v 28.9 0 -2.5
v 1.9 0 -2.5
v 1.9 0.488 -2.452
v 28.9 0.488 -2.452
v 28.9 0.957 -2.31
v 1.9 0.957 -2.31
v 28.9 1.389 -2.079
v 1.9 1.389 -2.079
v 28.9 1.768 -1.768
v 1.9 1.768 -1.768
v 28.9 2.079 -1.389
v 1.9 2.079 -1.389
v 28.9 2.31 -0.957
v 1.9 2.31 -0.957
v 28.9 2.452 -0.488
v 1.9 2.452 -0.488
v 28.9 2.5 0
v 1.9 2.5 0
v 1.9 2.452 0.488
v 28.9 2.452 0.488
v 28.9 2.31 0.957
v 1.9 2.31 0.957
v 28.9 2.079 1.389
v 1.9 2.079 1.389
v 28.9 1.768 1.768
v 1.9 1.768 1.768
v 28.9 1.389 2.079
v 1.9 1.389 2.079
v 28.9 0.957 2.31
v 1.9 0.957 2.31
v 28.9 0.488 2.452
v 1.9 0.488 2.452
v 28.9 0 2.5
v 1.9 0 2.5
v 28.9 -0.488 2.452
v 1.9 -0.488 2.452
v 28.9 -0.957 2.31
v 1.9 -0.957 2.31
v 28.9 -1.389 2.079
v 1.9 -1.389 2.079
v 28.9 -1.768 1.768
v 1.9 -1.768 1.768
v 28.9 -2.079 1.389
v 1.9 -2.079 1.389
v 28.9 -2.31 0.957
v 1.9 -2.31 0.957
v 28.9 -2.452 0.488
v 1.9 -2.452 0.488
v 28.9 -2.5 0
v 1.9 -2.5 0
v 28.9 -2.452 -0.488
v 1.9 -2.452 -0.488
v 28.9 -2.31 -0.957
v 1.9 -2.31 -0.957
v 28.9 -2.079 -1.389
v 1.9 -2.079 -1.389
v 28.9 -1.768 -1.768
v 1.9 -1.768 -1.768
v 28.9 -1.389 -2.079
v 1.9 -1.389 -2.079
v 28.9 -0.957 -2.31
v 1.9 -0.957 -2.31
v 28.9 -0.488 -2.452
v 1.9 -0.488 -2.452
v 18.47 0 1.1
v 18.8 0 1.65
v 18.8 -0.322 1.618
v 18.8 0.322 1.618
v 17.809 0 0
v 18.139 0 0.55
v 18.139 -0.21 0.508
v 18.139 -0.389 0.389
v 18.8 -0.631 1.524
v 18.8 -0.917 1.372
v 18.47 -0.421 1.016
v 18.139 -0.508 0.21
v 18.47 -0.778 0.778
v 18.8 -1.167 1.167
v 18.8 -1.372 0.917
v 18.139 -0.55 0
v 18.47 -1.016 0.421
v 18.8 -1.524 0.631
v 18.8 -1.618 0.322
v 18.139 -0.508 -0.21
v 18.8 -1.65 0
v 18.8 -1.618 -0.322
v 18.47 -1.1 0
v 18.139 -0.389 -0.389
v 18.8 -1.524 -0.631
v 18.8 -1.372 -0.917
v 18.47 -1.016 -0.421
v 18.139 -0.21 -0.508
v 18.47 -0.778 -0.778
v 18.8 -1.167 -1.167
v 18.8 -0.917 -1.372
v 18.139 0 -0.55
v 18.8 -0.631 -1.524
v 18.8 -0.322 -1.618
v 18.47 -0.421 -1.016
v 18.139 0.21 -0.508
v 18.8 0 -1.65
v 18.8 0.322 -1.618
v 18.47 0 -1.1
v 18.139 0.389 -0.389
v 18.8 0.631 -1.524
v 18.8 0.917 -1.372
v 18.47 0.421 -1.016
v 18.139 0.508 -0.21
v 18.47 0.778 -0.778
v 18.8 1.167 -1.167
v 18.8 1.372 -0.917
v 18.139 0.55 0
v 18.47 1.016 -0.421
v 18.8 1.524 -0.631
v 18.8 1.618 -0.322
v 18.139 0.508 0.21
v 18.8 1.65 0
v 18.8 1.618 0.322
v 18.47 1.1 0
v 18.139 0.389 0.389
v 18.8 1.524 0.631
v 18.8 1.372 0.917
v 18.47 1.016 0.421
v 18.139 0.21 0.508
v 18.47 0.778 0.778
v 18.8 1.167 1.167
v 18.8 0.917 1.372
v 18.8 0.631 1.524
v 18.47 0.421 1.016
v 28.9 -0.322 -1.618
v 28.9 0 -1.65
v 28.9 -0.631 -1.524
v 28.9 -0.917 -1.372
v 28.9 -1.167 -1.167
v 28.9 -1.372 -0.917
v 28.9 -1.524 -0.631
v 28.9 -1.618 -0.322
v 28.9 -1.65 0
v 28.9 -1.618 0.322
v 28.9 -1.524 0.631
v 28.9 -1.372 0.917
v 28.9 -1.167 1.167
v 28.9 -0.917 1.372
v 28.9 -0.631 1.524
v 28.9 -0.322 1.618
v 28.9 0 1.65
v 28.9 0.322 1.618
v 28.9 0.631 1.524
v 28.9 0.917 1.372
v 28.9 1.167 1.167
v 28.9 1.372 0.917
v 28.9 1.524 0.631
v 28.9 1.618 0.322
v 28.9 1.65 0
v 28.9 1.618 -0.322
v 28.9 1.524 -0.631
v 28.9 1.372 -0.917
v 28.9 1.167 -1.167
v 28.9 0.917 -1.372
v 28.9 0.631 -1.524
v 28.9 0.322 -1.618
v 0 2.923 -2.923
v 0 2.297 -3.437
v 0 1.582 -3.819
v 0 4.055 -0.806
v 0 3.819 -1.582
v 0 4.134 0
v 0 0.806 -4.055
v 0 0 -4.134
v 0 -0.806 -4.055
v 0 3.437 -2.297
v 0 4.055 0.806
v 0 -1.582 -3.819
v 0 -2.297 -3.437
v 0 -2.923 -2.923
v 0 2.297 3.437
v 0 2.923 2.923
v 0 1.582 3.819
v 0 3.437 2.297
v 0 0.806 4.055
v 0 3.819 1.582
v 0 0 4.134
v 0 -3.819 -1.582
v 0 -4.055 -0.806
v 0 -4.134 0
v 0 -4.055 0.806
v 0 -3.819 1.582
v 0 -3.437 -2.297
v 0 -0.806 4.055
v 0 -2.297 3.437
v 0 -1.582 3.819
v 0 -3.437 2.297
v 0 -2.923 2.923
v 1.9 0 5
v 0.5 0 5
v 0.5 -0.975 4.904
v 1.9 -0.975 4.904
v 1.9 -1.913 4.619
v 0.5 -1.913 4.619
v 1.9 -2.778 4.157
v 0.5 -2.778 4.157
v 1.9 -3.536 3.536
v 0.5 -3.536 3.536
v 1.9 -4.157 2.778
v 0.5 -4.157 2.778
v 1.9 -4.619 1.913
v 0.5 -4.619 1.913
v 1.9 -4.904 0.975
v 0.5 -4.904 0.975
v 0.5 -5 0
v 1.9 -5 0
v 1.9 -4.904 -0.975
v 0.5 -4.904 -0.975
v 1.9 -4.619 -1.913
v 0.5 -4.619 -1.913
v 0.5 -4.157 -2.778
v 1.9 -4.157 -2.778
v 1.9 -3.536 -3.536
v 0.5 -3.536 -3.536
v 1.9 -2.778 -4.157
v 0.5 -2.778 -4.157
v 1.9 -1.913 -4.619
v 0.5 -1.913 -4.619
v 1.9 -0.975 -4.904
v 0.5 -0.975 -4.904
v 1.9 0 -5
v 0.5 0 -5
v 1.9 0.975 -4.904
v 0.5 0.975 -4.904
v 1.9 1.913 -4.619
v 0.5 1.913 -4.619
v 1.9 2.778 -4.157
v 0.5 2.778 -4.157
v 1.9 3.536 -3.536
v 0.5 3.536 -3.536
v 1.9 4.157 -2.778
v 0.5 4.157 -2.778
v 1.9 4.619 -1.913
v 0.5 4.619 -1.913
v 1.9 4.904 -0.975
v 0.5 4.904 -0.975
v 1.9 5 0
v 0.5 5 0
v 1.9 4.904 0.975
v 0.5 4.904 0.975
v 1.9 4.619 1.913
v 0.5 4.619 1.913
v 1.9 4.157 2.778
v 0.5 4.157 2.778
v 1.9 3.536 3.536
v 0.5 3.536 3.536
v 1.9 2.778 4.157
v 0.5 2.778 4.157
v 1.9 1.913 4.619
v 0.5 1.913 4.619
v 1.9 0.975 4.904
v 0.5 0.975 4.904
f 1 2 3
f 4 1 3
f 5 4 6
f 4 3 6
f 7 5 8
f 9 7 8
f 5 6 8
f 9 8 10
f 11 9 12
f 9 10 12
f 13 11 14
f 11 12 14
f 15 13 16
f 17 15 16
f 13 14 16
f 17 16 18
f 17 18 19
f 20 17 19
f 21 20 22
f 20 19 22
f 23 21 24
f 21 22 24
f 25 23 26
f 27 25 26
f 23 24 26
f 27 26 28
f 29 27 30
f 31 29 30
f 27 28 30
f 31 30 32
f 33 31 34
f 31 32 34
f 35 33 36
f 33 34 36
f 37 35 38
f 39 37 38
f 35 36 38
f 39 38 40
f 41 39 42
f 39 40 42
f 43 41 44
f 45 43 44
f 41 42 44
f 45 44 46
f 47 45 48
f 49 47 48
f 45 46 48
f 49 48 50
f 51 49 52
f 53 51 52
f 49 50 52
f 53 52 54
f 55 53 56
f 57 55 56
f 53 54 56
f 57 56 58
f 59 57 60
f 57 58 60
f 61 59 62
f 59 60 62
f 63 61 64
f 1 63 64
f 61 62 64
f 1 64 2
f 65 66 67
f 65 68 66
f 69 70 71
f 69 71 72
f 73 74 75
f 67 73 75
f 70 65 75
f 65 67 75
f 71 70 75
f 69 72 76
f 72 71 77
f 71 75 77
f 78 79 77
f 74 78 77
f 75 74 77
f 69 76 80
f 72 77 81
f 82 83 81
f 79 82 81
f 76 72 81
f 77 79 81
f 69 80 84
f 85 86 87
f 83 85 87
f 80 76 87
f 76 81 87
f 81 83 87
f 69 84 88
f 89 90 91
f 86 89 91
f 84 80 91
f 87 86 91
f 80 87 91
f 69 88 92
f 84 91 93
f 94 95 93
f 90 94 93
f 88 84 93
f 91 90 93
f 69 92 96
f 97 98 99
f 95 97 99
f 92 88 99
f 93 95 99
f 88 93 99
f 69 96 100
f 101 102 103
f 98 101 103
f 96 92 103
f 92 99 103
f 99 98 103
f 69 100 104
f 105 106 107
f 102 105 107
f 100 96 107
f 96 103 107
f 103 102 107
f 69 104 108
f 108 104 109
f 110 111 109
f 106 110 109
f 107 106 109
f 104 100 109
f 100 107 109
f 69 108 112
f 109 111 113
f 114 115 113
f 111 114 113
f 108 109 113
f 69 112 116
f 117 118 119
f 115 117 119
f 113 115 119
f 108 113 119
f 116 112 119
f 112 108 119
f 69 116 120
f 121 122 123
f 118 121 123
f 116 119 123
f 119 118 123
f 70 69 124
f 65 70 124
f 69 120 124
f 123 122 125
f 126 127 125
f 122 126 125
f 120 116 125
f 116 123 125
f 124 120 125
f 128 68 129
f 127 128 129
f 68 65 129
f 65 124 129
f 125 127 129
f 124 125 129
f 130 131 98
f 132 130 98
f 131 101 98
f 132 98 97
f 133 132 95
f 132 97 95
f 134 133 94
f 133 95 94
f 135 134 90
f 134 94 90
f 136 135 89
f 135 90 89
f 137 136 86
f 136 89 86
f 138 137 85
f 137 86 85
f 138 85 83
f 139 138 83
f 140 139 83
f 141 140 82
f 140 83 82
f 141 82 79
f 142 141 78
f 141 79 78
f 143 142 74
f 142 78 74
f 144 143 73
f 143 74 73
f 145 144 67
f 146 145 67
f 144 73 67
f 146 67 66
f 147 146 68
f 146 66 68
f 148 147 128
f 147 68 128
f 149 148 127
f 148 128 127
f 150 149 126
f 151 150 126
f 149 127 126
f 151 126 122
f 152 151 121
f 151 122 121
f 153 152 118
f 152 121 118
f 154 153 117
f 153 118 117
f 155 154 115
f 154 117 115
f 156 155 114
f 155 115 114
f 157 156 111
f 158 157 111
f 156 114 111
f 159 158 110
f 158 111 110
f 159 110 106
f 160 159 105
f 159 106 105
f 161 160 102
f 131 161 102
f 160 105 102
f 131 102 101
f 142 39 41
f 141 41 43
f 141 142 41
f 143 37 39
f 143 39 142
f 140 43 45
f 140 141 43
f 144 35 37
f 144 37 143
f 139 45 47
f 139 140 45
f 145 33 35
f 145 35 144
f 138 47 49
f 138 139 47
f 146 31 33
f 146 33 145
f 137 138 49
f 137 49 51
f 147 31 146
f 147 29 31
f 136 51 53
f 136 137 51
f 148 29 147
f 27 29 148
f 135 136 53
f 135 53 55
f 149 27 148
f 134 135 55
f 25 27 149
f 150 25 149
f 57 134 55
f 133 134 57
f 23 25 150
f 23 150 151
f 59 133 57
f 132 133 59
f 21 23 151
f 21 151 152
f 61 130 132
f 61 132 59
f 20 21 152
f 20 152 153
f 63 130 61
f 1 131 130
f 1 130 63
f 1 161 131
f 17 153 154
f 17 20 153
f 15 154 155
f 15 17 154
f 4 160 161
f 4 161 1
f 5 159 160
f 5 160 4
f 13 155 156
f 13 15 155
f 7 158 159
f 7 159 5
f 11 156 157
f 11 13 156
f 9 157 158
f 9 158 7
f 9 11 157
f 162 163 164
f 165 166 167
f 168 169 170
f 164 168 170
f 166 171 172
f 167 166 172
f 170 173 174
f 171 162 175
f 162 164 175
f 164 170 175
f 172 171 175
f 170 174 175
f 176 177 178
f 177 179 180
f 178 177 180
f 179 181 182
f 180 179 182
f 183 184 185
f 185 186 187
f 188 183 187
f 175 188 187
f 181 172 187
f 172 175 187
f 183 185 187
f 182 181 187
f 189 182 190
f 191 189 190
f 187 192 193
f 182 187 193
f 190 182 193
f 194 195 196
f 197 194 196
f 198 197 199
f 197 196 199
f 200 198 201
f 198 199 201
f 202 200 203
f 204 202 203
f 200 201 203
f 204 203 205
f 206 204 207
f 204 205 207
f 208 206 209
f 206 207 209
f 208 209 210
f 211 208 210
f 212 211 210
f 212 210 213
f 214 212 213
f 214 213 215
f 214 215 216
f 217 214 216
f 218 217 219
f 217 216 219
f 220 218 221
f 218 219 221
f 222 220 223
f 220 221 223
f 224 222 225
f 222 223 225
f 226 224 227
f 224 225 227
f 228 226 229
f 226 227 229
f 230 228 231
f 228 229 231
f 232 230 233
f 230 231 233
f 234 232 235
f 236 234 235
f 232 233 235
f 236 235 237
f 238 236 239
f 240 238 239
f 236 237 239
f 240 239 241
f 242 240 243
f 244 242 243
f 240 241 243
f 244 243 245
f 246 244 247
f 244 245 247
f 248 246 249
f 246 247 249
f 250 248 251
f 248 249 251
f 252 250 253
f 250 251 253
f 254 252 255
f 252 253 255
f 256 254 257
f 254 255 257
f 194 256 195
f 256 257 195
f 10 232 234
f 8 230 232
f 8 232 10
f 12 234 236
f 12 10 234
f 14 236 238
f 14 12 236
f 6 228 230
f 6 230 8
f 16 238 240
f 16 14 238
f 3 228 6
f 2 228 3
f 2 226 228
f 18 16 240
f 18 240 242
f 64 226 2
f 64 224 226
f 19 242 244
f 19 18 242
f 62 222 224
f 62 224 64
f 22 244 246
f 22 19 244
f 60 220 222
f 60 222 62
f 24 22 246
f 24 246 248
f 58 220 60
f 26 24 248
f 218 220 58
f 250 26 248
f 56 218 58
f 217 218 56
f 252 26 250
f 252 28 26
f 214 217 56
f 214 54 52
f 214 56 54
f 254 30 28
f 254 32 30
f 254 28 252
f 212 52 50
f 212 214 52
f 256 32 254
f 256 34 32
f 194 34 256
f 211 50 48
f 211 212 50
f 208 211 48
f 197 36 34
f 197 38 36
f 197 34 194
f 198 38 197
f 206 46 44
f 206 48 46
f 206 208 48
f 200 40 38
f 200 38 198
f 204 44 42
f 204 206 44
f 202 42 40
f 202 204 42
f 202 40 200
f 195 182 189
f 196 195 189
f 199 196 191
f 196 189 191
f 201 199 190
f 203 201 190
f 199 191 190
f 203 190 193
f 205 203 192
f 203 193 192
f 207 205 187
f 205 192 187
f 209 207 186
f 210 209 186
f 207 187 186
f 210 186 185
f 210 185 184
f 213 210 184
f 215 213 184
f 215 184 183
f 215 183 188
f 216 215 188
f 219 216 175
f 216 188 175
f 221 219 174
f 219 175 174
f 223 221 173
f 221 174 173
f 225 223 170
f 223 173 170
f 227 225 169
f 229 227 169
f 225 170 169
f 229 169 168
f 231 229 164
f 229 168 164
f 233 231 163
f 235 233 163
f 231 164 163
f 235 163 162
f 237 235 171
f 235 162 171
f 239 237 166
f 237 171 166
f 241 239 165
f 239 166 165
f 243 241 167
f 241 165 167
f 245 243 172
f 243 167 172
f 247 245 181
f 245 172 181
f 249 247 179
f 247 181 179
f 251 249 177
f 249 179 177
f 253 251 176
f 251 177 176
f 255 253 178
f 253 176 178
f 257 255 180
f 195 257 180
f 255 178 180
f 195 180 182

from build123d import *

# Parameters (mm, degrees)
SKETCH_1_R             = 5
EXTRUDE_1_DEPTH        = 1.9
SKETCH_2_R             = 2.5
EXTRUDE_2_DEPTH        = 27
HOLE_WIZARD_M4_1_D     = 3.3
HOLE_WIZARD_M4_1_DEPTH = 10.1
HOLE_WIZARD_M4_1_TIP   = 0.991420021
CHAMFER_1_SIZE         = 0.5
CHAMFER_1_SIZE2        = 0.866025404


with BuildPart() as part:
    # 草图1 → 凸台-拉伸1 (new body)
    with BuildSketch(Plane(origin=(0, 0, 0), x_dir=(0, 0, -1), z_dir=(1, 0, 0))):
        with Locations(Location((0, 0, 0), (0, 0, 180))):
            Circle(SKETCH_1_R)
    extrude(amount=EXTRUDE_1_DEPTH)

    # 草图2 → 凸台-拉伸2 (add)
    with BuildSketch(Plane(origin=(1.9, 0, 0), x_dir=(0, 0, -1), z_dir=(1, 0, 0))):
        Circle(SKETCH_2_R)
    extrude(amount=EXTRUDE_2_DEPTH)

    # M4 螺纹孔1
    with Locations(Plane(origin=(28.9, 0, 0), x_dir=(0, 0, 1), z_dir=(1, 0, 0))):
        with Locations((0, 0)):
            Hole(HOLE_WIZARD_M4_1_D / 2, depth=HOLE_WIZARD_M4_1_DEPTH)
            with Locations((0, 0, -(HOLE_WIZARD_M4_1_DEPTH + HOLE_WIZARD_M4_1_TIP / 2))):  # 118° drill point
                Cone(0, HOLE_WIZARD_M4_1_D / 2, HOLE_WIZARD_M4_1_TIP, mode=Mode.SUBTRACT)

    # 倒角1
    chamfer_1_edges = [part.edges().sort_by_distance(p)[0] for p in [
        (0, 0, -5),
    ]]
    chamfer_1_side = [part.faces().sort_by_distance(p)[0] for p in [
        (0.95, 0, -5),
    ]]
    chamfer(chamfer_1_edges, length=CHAMFER_1_SIZE, length2=CHAMFER_1_SIZE2, reference=chamfer_1_side[0])


solid = part.part
